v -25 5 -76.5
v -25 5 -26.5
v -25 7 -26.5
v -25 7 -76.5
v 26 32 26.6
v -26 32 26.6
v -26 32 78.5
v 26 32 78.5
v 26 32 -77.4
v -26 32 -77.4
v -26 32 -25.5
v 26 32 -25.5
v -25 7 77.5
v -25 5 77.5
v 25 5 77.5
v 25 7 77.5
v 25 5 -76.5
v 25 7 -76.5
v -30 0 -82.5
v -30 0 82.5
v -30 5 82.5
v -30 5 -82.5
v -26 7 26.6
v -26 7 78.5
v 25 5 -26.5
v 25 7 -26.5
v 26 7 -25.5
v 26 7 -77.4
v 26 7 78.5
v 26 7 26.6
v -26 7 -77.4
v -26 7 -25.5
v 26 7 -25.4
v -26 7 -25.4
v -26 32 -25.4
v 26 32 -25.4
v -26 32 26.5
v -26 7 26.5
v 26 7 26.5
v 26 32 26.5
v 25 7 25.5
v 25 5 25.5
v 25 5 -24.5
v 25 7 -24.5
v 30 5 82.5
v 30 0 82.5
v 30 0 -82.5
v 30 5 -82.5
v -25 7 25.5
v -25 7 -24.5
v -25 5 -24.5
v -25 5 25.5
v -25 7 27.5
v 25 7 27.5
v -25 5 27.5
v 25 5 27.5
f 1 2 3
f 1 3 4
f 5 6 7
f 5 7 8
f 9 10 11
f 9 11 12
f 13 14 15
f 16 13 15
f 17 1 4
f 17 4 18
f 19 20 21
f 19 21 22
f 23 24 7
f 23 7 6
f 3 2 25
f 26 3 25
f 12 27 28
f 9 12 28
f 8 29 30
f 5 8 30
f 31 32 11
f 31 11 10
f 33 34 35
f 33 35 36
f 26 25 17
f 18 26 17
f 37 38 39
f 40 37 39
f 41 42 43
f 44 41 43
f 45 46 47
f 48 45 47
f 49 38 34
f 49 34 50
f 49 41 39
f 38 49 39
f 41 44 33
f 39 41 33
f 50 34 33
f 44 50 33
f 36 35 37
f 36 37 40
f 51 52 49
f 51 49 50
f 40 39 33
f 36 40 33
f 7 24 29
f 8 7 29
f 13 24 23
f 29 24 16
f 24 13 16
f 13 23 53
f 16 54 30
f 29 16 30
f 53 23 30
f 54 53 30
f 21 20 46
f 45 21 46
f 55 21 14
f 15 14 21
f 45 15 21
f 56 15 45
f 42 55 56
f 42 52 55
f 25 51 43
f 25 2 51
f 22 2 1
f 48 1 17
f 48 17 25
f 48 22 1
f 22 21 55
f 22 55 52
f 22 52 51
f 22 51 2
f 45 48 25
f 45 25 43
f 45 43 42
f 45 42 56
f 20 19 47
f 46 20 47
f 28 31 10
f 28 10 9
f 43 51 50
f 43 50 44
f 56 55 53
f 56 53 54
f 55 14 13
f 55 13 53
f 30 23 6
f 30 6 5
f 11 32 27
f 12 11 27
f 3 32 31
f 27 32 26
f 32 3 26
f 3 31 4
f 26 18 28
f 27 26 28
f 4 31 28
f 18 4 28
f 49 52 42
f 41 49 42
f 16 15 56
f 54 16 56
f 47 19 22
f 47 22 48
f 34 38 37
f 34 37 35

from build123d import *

# Parameters (mm, degrees)
SKETCH1_W           = 60
SKETCH1_H           = 165
BOSS_EXTRUDE1_DEPTH = 5
SKETCH2_W           = 50
SKETCH2_H           = 50
BOSS_EXTRUDE3_DEPTH = 2
LPATTERN1_COUNT     = 3
LPATTERN1_PITCH     = 52
SKETCH3_W           = 52
SKETCH3_H           = 51.9
BOSS_EXTRUDE8_DEPTH = 25
LPATTERN5_COUNT     = 3
LPATTERN5_PITCH     = 52


with BuildPart() as part:
    # Sketch1 → Boss-Extrude1 (new body)
    with BuildSketch(Plane(origin=(0, 0, 0), x_dir=(1, 0, 0), z_dir=(0, 1, 0))):
        Rectangle(SKETCH1_W, SKETCH1_H)
    extrude(amount=BOSS_EXTRUDE1_DEPTH)

    # Sketch2 → Boss-Extrude3 (add)
    with BuildSketch(Plane(origin=(0, 5, 0), x_dir=(1, 0, 0), z_dir=(0, 1, 0))):
        with Locations((0, -52.5)):
            Rectangle(SKETCH2_W, SKETCH2_H)
    boss_extrude3 = extrude(amount=BOSS_EXTRUDE3_DEPTH)

    # LPattern1: Boss-Extrude3 ×3
    with Locations(*[(0, 0, -i * LPATTERN1_PITCH) for i in range(1, LPATTERN1_COUNT)]):
        add(boss_extrude3)

    # Sketch3 → Boss-Extrude8 (add)
    with BuildSketch(Plane(origin=(0, 7, 0), x_dir=(1, 0, 0), z_dir=(0, 1, 0))):
        with Locations((0, -52.55)):
            Rectangle(SKETCH3_W, SKETCH3_H)
    boss_extrude8 = extrude(amount=BOSS_EXTRUDE8_DEPTH)

    # LPattern5: Boss-Extrude8 ×3
    with Locations(*[(0, 0, -i * LPATTERN5_PITCH) for i in range(1, LPATTERN5_COUNT)]):
        add(boss_extrude8)


solid = part.part
